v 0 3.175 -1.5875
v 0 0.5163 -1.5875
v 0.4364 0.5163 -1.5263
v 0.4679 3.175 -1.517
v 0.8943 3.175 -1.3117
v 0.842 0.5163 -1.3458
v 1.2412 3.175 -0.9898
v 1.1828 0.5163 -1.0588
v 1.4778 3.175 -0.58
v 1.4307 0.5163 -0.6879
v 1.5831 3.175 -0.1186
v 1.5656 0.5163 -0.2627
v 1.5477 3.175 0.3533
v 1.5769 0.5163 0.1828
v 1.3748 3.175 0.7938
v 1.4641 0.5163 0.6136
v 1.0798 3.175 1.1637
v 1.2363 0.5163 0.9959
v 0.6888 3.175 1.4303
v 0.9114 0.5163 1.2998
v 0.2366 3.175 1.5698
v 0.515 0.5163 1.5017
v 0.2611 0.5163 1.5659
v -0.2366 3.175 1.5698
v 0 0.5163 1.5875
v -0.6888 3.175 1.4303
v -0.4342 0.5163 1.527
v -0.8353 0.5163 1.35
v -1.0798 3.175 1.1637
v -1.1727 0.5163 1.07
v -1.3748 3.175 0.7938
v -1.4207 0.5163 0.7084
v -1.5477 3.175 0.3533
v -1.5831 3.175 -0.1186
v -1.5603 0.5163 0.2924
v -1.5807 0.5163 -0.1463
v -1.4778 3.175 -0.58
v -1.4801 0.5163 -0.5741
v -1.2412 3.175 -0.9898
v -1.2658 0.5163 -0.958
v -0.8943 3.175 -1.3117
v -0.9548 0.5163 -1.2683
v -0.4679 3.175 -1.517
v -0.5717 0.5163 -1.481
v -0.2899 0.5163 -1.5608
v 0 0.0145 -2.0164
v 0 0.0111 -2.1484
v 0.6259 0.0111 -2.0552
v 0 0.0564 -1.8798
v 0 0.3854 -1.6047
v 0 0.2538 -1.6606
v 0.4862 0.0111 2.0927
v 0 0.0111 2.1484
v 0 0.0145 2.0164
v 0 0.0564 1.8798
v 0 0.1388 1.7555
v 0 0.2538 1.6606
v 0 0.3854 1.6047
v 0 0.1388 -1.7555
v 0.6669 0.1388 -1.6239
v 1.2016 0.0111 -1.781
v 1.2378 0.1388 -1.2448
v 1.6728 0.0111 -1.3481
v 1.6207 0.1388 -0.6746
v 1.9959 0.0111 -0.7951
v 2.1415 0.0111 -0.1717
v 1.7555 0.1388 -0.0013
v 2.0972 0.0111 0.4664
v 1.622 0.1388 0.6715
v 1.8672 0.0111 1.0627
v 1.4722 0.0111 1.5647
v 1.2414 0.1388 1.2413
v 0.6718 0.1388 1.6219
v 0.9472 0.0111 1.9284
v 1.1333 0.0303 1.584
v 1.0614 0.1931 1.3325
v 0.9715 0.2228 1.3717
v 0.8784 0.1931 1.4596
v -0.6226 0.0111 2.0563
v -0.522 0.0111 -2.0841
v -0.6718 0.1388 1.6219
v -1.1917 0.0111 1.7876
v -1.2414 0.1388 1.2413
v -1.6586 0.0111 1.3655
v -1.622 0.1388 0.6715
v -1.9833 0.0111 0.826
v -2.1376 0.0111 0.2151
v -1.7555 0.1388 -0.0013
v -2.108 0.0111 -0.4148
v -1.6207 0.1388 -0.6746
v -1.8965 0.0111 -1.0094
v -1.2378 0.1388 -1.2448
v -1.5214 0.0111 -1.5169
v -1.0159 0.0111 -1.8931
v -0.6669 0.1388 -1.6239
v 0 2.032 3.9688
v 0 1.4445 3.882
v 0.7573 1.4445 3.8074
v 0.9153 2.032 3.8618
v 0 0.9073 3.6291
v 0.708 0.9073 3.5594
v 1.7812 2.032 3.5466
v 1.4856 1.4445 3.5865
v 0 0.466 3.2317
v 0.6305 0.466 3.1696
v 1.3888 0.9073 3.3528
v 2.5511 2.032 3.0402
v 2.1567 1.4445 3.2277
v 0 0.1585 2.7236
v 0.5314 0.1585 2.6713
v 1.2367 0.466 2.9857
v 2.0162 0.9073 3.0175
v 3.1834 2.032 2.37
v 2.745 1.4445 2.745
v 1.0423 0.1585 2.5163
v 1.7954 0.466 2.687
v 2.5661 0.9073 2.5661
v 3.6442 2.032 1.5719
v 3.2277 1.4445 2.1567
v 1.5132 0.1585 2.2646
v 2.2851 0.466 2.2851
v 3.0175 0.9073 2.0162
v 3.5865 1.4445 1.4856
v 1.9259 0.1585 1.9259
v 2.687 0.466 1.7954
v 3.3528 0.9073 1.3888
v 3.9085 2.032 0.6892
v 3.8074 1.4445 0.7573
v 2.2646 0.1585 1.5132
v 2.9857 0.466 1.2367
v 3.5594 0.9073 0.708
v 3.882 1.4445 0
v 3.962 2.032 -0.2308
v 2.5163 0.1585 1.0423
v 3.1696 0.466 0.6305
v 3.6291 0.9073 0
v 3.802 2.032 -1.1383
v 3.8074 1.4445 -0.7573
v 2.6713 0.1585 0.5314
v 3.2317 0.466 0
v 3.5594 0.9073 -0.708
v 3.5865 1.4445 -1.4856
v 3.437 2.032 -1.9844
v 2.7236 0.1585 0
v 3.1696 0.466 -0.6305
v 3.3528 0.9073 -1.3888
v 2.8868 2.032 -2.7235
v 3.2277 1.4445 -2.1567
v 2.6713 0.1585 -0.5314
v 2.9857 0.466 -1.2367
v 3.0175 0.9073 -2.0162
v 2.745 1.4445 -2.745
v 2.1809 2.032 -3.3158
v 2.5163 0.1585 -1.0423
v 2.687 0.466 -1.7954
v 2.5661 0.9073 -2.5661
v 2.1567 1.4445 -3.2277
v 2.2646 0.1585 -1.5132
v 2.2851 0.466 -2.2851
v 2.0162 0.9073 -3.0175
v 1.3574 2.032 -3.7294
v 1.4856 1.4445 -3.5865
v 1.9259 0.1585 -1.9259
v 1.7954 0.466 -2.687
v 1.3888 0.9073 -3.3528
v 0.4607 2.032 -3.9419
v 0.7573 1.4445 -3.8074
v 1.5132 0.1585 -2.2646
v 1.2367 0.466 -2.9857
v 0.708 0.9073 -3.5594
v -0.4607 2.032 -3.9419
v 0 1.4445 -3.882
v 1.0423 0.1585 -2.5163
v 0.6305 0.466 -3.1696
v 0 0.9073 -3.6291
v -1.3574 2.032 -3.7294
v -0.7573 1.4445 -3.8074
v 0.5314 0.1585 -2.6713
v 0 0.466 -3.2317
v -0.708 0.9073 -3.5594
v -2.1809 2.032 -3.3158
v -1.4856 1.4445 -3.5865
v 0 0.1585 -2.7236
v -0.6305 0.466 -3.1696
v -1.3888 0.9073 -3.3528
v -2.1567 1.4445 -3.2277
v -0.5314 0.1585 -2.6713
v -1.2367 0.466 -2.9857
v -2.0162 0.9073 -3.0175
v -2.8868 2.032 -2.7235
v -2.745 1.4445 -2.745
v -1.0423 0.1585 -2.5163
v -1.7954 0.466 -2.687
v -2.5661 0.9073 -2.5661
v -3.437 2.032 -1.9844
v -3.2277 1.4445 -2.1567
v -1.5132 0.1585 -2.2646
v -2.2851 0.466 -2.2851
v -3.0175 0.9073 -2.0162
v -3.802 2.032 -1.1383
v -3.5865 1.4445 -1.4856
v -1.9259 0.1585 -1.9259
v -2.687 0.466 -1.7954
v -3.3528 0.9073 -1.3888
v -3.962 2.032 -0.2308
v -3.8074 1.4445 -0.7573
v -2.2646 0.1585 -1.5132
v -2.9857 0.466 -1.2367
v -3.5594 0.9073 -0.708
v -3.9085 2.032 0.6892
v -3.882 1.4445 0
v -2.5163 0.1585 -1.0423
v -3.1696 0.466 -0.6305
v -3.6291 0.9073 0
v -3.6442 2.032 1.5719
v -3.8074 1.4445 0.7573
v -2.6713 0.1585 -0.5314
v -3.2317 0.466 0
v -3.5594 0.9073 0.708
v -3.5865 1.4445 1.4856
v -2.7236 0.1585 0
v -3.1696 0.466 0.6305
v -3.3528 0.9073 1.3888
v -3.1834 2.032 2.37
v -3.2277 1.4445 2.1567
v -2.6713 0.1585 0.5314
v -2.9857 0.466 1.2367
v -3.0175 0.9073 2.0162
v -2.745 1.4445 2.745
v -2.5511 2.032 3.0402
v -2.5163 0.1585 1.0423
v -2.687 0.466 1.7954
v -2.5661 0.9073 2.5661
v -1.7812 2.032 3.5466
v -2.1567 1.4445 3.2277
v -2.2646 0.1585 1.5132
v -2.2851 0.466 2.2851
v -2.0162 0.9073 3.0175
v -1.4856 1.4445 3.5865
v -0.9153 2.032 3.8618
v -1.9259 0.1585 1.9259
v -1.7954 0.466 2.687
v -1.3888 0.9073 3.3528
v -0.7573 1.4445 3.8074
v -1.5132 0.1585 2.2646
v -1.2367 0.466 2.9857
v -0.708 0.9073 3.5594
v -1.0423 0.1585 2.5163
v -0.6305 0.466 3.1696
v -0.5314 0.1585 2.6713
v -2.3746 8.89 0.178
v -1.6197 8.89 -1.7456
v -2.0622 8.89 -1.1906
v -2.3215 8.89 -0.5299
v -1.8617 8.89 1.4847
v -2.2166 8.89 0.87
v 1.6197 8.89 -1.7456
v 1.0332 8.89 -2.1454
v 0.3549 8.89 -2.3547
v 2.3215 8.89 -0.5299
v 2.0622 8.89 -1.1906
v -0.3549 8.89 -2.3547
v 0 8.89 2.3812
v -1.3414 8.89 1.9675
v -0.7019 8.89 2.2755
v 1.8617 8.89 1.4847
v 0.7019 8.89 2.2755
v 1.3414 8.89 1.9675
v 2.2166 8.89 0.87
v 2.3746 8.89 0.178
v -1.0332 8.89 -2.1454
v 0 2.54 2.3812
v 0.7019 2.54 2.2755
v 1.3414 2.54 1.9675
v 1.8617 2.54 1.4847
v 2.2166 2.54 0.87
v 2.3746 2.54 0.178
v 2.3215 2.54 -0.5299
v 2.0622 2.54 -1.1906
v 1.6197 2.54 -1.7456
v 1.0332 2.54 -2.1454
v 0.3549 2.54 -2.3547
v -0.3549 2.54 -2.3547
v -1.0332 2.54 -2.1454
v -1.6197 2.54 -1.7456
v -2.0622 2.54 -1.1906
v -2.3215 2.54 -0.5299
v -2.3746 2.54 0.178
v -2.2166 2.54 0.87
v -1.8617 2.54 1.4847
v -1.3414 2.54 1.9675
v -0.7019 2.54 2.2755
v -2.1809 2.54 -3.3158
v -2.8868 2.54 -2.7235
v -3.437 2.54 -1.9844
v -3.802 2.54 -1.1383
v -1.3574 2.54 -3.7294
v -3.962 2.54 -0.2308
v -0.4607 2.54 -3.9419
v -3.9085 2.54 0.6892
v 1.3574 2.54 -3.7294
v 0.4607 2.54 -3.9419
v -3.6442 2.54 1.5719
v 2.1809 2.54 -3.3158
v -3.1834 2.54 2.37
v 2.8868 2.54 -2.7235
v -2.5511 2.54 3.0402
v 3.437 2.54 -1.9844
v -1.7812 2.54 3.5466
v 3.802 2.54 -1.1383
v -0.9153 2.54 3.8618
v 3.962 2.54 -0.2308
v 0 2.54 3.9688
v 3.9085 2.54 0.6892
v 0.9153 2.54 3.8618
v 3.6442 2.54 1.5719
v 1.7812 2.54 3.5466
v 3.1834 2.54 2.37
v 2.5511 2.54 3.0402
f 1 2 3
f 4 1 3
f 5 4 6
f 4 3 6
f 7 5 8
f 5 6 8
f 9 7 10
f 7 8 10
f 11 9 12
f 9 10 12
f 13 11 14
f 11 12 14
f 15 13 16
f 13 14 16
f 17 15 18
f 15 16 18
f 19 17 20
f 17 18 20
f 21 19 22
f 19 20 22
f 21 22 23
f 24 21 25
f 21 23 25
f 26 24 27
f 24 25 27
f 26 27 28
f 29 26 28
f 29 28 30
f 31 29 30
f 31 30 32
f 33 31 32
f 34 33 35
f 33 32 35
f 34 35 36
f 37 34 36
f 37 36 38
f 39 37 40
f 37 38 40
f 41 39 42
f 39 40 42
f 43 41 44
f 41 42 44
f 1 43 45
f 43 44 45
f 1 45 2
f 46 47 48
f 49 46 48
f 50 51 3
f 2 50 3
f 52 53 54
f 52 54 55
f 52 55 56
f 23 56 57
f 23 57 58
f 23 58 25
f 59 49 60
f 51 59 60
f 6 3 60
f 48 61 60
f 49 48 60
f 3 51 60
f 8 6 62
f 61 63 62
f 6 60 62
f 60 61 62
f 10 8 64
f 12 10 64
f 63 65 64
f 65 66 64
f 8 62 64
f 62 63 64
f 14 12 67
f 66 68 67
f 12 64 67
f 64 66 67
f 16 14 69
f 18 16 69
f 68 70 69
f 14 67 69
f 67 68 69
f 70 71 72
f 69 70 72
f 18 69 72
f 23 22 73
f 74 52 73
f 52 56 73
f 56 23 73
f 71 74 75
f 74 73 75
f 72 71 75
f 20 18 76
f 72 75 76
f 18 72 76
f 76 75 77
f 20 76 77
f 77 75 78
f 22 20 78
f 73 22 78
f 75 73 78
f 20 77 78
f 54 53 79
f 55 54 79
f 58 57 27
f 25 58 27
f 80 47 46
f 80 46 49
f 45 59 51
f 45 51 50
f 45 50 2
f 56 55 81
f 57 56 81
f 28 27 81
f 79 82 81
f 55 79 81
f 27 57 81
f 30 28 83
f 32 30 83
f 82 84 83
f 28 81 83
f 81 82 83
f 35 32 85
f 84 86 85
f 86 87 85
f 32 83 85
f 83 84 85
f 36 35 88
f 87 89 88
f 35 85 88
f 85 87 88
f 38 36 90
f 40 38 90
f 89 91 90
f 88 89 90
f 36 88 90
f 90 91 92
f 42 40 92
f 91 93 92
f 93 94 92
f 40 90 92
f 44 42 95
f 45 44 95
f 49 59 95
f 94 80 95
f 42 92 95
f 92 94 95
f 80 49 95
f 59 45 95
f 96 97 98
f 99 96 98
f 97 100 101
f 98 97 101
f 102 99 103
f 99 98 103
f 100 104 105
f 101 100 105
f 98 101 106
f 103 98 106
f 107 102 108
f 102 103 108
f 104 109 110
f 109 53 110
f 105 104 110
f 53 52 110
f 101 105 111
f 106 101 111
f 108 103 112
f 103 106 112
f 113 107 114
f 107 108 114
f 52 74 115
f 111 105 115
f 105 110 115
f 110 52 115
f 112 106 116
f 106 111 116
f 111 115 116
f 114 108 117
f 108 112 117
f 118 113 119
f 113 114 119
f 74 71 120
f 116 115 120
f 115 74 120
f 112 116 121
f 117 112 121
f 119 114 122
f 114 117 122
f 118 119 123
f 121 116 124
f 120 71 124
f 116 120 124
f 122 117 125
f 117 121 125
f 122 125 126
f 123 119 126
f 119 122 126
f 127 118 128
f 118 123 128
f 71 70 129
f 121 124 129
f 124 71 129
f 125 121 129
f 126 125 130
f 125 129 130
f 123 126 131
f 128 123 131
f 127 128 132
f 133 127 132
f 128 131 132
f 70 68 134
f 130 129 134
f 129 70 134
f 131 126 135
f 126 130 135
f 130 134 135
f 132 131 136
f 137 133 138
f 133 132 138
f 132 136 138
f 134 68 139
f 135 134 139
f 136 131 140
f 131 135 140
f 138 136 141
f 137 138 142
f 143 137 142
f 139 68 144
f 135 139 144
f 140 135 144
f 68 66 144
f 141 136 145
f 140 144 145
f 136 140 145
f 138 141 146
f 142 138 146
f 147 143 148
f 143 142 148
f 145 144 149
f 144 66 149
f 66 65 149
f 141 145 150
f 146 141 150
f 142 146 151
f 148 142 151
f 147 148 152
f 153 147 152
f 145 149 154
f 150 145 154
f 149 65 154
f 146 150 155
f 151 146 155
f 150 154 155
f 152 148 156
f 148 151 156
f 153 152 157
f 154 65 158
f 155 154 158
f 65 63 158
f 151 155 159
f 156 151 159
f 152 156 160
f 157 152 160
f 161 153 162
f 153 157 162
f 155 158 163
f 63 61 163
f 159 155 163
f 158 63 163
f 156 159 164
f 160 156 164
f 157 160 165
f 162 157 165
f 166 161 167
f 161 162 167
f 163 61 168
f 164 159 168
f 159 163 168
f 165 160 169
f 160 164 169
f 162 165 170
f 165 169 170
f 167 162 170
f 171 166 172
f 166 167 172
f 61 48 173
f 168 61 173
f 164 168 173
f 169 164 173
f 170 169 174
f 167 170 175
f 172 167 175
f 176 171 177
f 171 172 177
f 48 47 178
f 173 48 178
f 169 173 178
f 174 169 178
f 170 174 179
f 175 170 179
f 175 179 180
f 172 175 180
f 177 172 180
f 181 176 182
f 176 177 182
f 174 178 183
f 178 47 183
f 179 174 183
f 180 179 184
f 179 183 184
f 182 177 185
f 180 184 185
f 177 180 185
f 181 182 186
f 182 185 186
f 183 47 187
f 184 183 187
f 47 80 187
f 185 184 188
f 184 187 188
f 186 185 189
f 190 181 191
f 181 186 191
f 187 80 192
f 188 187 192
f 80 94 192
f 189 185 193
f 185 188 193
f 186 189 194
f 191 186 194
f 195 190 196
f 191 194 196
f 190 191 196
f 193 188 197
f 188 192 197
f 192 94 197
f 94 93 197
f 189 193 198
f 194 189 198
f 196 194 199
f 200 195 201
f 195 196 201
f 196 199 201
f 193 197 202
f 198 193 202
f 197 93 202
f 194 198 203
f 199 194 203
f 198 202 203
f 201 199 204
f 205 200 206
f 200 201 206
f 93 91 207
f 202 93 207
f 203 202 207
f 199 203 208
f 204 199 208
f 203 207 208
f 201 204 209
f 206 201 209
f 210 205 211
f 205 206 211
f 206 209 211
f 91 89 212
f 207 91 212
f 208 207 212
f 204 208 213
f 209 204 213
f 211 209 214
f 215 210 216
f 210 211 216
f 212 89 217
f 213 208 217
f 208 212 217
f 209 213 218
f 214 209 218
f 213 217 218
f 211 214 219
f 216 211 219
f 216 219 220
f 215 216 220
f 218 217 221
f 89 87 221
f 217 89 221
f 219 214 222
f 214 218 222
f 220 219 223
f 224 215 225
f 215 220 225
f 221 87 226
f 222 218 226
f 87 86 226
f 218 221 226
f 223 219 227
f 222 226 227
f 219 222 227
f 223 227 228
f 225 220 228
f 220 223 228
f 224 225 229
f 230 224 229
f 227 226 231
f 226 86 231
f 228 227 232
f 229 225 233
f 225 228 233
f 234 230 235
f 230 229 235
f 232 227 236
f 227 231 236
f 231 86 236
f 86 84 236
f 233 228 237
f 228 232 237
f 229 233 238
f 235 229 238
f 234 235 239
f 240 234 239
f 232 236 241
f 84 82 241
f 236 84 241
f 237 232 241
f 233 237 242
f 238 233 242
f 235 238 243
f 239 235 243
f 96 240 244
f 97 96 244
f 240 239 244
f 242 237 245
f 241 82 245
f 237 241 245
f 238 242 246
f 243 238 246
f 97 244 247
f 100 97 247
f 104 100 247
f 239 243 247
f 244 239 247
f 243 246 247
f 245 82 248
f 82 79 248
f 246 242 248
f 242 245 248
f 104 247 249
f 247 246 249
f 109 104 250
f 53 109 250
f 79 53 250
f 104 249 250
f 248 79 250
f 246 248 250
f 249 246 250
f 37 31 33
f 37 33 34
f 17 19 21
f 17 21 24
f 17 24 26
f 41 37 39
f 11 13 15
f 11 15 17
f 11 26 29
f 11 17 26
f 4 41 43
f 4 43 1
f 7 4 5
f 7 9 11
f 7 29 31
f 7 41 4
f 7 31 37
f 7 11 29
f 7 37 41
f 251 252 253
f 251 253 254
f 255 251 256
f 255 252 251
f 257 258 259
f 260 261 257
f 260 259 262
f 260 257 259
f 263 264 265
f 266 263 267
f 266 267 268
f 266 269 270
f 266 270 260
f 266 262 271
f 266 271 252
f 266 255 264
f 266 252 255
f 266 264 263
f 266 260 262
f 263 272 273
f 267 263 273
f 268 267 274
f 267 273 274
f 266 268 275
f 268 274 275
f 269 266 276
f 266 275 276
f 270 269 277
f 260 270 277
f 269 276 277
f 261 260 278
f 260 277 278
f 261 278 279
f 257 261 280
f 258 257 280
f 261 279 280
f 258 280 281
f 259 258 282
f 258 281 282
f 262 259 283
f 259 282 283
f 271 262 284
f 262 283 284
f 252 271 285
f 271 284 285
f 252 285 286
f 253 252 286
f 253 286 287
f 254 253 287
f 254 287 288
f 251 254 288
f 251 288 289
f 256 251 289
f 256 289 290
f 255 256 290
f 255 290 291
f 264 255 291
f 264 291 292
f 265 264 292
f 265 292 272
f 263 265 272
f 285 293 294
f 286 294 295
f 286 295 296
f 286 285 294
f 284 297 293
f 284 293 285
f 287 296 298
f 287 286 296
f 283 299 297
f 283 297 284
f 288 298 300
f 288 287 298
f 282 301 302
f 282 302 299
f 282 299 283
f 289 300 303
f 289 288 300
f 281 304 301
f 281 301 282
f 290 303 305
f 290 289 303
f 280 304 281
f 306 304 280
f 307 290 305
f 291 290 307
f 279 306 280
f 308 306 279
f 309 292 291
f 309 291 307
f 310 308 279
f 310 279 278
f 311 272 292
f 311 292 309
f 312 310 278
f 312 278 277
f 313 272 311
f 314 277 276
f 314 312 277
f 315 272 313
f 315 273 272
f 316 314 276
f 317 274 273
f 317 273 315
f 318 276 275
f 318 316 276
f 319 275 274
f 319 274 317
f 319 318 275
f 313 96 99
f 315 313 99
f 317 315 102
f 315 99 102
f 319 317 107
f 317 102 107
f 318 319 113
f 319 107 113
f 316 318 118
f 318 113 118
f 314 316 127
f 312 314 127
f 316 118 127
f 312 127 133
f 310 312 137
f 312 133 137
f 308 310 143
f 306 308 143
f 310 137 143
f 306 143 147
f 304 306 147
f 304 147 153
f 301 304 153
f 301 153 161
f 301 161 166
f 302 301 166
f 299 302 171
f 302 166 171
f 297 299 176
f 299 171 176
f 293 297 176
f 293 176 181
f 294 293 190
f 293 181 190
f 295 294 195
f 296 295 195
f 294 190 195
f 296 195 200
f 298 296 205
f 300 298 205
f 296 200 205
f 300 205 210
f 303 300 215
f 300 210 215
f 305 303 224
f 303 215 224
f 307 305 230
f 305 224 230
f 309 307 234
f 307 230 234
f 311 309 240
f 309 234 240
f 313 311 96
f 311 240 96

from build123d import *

# Parameters (mm, degrees)
SKETCH1_R                = 3.96875
SKETCH1_R_2              = 2.38125
BOSS_EXTRUDE2_DEPTH      = 2.54
BOSS_EXTRUDE3_DEPTH      = 6.35
BOSS_EXTRUDE3_DEPTH_BACK = 2.54
SKETCH2_R                = 2.38125
SKETCH3_R                = 1.5875
CUT_EXTRUDE1_DEPTH       = 3.175
FILLET1_R                = 2.032
FILLET2_R                = 0.508


with BuildPart() as part:
    # Sketch1 → Boss-Extrude2 (new body)
    with BuildSketch(Plane(origin=(0, 0, 0), x_dir=(1, 0, 0), z_dir=(0, 1, 0))):
        with Locations(Location((0, 0, 0), (0, 0, 270))):
            Circle(SKETCH1_R)
        with Locations(Location((0, 0, 0), (0, 0, 270))):
            Circle(SKETCH1_R_2, mode=Mode.SUBTRACT)
    extrude(amount=BOSS_EXTRUDE2_DEPTH)

    # Sketch2 → Boss-Extrude3 (add, two sides: drawn at the far end of the back side and taken through both)
    with BuildSketch(Plane(origin=(0, 2.54, 0), x_dir=(1, 0, 0), z_dir=(0, 1, 0)).offset(-BOSS_EXTRUDE3_DEPTH_BACK)):
        with Locations(Location((0, 0, 0), (0, 0, 270))):
            Circle(SKETCH2_R)
    extrude(amount=BOSS_EXTRUDE3_DEPTH + BOSS_EXTRUDE3_DEPTH_BACK)

    # Sketch3 → Cut-Extrude1 (cut)
    with BuildSketch(Plane(origin=(0, 0, 0), x_dir=(-1, 0, 0), z_dir=(0, -1, 0))):
        with Locations(Location((0, 0, 0), (0, 0, 90))):
            Circle(SKETCH3_R)
    extrude(amount=-CUT_EXTRUDE1_DEPTH, mode=Mode.SUBTRACT)

    # Fillet1
    fillet1_edges = [part.edges().sort_by_distance(p)[0] for p in [
        (0, 0, -3.96875),
    ]]
    fillet(fillet1_edges, radius=FILLET1_R)

    # Fillet2
    fillet2_edges = [part.edges().sort_by_distance(p)[0] for p in [
        (0, 0, 1.5875),
    ]]
    fillet(fillet2_edges, radius=FILLET2_R)


solid = part.part
